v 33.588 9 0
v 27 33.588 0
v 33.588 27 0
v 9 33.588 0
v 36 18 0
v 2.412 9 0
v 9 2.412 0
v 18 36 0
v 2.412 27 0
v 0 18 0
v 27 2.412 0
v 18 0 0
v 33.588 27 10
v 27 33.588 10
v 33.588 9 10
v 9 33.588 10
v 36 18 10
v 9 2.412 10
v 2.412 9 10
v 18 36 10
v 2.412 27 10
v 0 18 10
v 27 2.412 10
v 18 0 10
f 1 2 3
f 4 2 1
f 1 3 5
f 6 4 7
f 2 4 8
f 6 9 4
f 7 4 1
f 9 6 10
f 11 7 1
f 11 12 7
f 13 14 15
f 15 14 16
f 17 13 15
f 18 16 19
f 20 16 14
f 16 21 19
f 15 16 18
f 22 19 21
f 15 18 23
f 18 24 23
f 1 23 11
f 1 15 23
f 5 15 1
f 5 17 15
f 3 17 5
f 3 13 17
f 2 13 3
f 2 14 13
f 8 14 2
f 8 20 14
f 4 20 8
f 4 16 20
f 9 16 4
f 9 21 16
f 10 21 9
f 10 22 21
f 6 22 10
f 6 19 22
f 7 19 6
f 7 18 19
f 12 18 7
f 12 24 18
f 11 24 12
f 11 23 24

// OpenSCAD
$fn = 32;

// ----------------------------------------------------------------------
// Flat adaptor: keyed, 10 mm thick
// ----------------------------------------------------------------------

// --- parameters (mm) ---
profile_height = 10;      // extrusion height
profile_points = 12;      // points of the closed outline

profile = [[0, 18], [2.412, 9], [9, 2.412], [18, 0], [27, 2.412], [33.588, 9], [36, 18], [33.588, 27], [27, 33.588], [18, 36], [9, 33.588], [2.412, 27]];  // single closed polygon, 12 points, counter clockwise

// --- the one profile operation ---
linear_extrude(height = profile_height) polygon(points = profile);
